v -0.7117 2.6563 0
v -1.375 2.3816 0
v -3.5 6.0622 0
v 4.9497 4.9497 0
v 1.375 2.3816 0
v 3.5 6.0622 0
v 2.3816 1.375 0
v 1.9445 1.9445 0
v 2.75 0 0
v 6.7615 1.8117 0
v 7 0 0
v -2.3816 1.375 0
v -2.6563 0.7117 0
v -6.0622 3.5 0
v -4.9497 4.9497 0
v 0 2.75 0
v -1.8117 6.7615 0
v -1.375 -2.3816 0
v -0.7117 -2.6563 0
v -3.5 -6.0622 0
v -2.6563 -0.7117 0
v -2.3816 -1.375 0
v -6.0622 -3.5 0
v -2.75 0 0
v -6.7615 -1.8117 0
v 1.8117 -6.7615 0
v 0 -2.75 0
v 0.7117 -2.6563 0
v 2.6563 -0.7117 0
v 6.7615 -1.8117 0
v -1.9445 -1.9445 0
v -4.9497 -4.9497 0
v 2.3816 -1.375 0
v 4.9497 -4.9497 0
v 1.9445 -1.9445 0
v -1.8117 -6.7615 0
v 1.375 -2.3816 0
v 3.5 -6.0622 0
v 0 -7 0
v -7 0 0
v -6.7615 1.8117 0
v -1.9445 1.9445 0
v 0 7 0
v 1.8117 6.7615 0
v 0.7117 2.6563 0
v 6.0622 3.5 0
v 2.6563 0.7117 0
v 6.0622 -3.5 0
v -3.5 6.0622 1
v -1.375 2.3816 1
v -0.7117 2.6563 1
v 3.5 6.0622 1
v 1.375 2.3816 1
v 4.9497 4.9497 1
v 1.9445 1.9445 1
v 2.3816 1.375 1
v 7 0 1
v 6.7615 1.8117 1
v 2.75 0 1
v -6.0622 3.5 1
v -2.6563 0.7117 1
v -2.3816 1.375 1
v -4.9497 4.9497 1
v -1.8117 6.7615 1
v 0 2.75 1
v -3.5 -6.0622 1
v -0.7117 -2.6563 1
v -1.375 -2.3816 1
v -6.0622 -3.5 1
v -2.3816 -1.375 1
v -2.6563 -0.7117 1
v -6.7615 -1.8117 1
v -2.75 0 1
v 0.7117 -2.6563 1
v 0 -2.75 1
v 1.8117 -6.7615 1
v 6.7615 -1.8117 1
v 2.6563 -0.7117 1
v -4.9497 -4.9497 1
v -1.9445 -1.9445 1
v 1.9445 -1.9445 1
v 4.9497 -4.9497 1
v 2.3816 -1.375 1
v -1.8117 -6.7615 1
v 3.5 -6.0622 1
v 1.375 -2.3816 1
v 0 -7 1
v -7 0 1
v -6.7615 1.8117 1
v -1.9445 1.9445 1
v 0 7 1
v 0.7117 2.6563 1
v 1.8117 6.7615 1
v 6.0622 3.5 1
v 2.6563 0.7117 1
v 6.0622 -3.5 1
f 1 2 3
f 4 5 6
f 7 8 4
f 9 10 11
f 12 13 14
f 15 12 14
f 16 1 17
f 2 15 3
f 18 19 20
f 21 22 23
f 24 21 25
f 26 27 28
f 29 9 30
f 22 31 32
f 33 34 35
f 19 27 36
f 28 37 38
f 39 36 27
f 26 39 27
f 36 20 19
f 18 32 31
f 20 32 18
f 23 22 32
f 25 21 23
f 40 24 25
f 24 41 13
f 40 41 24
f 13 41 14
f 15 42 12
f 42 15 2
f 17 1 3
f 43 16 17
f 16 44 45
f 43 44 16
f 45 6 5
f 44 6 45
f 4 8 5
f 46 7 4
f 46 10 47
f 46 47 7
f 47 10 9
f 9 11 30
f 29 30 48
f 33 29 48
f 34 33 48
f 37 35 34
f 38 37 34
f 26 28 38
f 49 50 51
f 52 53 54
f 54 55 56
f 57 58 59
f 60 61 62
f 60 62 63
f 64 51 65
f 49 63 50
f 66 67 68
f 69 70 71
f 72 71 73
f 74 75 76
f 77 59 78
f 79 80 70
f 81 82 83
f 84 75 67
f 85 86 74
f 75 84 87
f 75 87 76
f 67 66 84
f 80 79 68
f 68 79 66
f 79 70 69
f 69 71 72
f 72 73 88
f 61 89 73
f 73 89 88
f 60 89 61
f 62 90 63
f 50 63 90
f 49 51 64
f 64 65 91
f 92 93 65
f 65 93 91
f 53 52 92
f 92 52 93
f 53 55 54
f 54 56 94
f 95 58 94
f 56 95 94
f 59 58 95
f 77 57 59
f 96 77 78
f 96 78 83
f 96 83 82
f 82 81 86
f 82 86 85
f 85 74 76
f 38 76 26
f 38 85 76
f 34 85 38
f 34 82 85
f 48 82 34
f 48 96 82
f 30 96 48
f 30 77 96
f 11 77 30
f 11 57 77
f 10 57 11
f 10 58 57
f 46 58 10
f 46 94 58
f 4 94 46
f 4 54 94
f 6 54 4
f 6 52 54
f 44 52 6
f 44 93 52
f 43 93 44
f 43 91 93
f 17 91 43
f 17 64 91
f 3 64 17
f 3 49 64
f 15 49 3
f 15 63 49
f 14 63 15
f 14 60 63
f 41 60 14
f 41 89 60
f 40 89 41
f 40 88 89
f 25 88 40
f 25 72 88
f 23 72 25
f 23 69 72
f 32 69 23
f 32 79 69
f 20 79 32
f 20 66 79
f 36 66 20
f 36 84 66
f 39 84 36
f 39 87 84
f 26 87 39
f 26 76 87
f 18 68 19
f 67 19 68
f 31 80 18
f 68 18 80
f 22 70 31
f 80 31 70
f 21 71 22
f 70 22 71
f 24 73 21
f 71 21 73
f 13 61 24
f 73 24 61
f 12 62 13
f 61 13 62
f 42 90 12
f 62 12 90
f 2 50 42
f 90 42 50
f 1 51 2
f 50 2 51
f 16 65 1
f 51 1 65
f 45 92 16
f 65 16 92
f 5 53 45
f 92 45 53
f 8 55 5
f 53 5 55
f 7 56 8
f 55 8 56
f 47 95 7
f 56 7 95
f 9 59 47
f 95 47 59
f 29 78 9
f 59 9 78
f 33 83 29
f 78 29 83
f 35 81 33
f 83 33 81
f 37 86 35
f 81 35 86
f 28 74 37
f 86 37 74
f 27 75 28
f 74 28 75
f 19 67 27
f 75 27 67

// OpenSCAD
hole = 5.5; //mm
width= 14; //mm
thickness = 1;//mm
$fn = 24;

linear_extrude(thickness) {
  difference() {
    circle(d=width);
    circle(d=hole);
  }
}
